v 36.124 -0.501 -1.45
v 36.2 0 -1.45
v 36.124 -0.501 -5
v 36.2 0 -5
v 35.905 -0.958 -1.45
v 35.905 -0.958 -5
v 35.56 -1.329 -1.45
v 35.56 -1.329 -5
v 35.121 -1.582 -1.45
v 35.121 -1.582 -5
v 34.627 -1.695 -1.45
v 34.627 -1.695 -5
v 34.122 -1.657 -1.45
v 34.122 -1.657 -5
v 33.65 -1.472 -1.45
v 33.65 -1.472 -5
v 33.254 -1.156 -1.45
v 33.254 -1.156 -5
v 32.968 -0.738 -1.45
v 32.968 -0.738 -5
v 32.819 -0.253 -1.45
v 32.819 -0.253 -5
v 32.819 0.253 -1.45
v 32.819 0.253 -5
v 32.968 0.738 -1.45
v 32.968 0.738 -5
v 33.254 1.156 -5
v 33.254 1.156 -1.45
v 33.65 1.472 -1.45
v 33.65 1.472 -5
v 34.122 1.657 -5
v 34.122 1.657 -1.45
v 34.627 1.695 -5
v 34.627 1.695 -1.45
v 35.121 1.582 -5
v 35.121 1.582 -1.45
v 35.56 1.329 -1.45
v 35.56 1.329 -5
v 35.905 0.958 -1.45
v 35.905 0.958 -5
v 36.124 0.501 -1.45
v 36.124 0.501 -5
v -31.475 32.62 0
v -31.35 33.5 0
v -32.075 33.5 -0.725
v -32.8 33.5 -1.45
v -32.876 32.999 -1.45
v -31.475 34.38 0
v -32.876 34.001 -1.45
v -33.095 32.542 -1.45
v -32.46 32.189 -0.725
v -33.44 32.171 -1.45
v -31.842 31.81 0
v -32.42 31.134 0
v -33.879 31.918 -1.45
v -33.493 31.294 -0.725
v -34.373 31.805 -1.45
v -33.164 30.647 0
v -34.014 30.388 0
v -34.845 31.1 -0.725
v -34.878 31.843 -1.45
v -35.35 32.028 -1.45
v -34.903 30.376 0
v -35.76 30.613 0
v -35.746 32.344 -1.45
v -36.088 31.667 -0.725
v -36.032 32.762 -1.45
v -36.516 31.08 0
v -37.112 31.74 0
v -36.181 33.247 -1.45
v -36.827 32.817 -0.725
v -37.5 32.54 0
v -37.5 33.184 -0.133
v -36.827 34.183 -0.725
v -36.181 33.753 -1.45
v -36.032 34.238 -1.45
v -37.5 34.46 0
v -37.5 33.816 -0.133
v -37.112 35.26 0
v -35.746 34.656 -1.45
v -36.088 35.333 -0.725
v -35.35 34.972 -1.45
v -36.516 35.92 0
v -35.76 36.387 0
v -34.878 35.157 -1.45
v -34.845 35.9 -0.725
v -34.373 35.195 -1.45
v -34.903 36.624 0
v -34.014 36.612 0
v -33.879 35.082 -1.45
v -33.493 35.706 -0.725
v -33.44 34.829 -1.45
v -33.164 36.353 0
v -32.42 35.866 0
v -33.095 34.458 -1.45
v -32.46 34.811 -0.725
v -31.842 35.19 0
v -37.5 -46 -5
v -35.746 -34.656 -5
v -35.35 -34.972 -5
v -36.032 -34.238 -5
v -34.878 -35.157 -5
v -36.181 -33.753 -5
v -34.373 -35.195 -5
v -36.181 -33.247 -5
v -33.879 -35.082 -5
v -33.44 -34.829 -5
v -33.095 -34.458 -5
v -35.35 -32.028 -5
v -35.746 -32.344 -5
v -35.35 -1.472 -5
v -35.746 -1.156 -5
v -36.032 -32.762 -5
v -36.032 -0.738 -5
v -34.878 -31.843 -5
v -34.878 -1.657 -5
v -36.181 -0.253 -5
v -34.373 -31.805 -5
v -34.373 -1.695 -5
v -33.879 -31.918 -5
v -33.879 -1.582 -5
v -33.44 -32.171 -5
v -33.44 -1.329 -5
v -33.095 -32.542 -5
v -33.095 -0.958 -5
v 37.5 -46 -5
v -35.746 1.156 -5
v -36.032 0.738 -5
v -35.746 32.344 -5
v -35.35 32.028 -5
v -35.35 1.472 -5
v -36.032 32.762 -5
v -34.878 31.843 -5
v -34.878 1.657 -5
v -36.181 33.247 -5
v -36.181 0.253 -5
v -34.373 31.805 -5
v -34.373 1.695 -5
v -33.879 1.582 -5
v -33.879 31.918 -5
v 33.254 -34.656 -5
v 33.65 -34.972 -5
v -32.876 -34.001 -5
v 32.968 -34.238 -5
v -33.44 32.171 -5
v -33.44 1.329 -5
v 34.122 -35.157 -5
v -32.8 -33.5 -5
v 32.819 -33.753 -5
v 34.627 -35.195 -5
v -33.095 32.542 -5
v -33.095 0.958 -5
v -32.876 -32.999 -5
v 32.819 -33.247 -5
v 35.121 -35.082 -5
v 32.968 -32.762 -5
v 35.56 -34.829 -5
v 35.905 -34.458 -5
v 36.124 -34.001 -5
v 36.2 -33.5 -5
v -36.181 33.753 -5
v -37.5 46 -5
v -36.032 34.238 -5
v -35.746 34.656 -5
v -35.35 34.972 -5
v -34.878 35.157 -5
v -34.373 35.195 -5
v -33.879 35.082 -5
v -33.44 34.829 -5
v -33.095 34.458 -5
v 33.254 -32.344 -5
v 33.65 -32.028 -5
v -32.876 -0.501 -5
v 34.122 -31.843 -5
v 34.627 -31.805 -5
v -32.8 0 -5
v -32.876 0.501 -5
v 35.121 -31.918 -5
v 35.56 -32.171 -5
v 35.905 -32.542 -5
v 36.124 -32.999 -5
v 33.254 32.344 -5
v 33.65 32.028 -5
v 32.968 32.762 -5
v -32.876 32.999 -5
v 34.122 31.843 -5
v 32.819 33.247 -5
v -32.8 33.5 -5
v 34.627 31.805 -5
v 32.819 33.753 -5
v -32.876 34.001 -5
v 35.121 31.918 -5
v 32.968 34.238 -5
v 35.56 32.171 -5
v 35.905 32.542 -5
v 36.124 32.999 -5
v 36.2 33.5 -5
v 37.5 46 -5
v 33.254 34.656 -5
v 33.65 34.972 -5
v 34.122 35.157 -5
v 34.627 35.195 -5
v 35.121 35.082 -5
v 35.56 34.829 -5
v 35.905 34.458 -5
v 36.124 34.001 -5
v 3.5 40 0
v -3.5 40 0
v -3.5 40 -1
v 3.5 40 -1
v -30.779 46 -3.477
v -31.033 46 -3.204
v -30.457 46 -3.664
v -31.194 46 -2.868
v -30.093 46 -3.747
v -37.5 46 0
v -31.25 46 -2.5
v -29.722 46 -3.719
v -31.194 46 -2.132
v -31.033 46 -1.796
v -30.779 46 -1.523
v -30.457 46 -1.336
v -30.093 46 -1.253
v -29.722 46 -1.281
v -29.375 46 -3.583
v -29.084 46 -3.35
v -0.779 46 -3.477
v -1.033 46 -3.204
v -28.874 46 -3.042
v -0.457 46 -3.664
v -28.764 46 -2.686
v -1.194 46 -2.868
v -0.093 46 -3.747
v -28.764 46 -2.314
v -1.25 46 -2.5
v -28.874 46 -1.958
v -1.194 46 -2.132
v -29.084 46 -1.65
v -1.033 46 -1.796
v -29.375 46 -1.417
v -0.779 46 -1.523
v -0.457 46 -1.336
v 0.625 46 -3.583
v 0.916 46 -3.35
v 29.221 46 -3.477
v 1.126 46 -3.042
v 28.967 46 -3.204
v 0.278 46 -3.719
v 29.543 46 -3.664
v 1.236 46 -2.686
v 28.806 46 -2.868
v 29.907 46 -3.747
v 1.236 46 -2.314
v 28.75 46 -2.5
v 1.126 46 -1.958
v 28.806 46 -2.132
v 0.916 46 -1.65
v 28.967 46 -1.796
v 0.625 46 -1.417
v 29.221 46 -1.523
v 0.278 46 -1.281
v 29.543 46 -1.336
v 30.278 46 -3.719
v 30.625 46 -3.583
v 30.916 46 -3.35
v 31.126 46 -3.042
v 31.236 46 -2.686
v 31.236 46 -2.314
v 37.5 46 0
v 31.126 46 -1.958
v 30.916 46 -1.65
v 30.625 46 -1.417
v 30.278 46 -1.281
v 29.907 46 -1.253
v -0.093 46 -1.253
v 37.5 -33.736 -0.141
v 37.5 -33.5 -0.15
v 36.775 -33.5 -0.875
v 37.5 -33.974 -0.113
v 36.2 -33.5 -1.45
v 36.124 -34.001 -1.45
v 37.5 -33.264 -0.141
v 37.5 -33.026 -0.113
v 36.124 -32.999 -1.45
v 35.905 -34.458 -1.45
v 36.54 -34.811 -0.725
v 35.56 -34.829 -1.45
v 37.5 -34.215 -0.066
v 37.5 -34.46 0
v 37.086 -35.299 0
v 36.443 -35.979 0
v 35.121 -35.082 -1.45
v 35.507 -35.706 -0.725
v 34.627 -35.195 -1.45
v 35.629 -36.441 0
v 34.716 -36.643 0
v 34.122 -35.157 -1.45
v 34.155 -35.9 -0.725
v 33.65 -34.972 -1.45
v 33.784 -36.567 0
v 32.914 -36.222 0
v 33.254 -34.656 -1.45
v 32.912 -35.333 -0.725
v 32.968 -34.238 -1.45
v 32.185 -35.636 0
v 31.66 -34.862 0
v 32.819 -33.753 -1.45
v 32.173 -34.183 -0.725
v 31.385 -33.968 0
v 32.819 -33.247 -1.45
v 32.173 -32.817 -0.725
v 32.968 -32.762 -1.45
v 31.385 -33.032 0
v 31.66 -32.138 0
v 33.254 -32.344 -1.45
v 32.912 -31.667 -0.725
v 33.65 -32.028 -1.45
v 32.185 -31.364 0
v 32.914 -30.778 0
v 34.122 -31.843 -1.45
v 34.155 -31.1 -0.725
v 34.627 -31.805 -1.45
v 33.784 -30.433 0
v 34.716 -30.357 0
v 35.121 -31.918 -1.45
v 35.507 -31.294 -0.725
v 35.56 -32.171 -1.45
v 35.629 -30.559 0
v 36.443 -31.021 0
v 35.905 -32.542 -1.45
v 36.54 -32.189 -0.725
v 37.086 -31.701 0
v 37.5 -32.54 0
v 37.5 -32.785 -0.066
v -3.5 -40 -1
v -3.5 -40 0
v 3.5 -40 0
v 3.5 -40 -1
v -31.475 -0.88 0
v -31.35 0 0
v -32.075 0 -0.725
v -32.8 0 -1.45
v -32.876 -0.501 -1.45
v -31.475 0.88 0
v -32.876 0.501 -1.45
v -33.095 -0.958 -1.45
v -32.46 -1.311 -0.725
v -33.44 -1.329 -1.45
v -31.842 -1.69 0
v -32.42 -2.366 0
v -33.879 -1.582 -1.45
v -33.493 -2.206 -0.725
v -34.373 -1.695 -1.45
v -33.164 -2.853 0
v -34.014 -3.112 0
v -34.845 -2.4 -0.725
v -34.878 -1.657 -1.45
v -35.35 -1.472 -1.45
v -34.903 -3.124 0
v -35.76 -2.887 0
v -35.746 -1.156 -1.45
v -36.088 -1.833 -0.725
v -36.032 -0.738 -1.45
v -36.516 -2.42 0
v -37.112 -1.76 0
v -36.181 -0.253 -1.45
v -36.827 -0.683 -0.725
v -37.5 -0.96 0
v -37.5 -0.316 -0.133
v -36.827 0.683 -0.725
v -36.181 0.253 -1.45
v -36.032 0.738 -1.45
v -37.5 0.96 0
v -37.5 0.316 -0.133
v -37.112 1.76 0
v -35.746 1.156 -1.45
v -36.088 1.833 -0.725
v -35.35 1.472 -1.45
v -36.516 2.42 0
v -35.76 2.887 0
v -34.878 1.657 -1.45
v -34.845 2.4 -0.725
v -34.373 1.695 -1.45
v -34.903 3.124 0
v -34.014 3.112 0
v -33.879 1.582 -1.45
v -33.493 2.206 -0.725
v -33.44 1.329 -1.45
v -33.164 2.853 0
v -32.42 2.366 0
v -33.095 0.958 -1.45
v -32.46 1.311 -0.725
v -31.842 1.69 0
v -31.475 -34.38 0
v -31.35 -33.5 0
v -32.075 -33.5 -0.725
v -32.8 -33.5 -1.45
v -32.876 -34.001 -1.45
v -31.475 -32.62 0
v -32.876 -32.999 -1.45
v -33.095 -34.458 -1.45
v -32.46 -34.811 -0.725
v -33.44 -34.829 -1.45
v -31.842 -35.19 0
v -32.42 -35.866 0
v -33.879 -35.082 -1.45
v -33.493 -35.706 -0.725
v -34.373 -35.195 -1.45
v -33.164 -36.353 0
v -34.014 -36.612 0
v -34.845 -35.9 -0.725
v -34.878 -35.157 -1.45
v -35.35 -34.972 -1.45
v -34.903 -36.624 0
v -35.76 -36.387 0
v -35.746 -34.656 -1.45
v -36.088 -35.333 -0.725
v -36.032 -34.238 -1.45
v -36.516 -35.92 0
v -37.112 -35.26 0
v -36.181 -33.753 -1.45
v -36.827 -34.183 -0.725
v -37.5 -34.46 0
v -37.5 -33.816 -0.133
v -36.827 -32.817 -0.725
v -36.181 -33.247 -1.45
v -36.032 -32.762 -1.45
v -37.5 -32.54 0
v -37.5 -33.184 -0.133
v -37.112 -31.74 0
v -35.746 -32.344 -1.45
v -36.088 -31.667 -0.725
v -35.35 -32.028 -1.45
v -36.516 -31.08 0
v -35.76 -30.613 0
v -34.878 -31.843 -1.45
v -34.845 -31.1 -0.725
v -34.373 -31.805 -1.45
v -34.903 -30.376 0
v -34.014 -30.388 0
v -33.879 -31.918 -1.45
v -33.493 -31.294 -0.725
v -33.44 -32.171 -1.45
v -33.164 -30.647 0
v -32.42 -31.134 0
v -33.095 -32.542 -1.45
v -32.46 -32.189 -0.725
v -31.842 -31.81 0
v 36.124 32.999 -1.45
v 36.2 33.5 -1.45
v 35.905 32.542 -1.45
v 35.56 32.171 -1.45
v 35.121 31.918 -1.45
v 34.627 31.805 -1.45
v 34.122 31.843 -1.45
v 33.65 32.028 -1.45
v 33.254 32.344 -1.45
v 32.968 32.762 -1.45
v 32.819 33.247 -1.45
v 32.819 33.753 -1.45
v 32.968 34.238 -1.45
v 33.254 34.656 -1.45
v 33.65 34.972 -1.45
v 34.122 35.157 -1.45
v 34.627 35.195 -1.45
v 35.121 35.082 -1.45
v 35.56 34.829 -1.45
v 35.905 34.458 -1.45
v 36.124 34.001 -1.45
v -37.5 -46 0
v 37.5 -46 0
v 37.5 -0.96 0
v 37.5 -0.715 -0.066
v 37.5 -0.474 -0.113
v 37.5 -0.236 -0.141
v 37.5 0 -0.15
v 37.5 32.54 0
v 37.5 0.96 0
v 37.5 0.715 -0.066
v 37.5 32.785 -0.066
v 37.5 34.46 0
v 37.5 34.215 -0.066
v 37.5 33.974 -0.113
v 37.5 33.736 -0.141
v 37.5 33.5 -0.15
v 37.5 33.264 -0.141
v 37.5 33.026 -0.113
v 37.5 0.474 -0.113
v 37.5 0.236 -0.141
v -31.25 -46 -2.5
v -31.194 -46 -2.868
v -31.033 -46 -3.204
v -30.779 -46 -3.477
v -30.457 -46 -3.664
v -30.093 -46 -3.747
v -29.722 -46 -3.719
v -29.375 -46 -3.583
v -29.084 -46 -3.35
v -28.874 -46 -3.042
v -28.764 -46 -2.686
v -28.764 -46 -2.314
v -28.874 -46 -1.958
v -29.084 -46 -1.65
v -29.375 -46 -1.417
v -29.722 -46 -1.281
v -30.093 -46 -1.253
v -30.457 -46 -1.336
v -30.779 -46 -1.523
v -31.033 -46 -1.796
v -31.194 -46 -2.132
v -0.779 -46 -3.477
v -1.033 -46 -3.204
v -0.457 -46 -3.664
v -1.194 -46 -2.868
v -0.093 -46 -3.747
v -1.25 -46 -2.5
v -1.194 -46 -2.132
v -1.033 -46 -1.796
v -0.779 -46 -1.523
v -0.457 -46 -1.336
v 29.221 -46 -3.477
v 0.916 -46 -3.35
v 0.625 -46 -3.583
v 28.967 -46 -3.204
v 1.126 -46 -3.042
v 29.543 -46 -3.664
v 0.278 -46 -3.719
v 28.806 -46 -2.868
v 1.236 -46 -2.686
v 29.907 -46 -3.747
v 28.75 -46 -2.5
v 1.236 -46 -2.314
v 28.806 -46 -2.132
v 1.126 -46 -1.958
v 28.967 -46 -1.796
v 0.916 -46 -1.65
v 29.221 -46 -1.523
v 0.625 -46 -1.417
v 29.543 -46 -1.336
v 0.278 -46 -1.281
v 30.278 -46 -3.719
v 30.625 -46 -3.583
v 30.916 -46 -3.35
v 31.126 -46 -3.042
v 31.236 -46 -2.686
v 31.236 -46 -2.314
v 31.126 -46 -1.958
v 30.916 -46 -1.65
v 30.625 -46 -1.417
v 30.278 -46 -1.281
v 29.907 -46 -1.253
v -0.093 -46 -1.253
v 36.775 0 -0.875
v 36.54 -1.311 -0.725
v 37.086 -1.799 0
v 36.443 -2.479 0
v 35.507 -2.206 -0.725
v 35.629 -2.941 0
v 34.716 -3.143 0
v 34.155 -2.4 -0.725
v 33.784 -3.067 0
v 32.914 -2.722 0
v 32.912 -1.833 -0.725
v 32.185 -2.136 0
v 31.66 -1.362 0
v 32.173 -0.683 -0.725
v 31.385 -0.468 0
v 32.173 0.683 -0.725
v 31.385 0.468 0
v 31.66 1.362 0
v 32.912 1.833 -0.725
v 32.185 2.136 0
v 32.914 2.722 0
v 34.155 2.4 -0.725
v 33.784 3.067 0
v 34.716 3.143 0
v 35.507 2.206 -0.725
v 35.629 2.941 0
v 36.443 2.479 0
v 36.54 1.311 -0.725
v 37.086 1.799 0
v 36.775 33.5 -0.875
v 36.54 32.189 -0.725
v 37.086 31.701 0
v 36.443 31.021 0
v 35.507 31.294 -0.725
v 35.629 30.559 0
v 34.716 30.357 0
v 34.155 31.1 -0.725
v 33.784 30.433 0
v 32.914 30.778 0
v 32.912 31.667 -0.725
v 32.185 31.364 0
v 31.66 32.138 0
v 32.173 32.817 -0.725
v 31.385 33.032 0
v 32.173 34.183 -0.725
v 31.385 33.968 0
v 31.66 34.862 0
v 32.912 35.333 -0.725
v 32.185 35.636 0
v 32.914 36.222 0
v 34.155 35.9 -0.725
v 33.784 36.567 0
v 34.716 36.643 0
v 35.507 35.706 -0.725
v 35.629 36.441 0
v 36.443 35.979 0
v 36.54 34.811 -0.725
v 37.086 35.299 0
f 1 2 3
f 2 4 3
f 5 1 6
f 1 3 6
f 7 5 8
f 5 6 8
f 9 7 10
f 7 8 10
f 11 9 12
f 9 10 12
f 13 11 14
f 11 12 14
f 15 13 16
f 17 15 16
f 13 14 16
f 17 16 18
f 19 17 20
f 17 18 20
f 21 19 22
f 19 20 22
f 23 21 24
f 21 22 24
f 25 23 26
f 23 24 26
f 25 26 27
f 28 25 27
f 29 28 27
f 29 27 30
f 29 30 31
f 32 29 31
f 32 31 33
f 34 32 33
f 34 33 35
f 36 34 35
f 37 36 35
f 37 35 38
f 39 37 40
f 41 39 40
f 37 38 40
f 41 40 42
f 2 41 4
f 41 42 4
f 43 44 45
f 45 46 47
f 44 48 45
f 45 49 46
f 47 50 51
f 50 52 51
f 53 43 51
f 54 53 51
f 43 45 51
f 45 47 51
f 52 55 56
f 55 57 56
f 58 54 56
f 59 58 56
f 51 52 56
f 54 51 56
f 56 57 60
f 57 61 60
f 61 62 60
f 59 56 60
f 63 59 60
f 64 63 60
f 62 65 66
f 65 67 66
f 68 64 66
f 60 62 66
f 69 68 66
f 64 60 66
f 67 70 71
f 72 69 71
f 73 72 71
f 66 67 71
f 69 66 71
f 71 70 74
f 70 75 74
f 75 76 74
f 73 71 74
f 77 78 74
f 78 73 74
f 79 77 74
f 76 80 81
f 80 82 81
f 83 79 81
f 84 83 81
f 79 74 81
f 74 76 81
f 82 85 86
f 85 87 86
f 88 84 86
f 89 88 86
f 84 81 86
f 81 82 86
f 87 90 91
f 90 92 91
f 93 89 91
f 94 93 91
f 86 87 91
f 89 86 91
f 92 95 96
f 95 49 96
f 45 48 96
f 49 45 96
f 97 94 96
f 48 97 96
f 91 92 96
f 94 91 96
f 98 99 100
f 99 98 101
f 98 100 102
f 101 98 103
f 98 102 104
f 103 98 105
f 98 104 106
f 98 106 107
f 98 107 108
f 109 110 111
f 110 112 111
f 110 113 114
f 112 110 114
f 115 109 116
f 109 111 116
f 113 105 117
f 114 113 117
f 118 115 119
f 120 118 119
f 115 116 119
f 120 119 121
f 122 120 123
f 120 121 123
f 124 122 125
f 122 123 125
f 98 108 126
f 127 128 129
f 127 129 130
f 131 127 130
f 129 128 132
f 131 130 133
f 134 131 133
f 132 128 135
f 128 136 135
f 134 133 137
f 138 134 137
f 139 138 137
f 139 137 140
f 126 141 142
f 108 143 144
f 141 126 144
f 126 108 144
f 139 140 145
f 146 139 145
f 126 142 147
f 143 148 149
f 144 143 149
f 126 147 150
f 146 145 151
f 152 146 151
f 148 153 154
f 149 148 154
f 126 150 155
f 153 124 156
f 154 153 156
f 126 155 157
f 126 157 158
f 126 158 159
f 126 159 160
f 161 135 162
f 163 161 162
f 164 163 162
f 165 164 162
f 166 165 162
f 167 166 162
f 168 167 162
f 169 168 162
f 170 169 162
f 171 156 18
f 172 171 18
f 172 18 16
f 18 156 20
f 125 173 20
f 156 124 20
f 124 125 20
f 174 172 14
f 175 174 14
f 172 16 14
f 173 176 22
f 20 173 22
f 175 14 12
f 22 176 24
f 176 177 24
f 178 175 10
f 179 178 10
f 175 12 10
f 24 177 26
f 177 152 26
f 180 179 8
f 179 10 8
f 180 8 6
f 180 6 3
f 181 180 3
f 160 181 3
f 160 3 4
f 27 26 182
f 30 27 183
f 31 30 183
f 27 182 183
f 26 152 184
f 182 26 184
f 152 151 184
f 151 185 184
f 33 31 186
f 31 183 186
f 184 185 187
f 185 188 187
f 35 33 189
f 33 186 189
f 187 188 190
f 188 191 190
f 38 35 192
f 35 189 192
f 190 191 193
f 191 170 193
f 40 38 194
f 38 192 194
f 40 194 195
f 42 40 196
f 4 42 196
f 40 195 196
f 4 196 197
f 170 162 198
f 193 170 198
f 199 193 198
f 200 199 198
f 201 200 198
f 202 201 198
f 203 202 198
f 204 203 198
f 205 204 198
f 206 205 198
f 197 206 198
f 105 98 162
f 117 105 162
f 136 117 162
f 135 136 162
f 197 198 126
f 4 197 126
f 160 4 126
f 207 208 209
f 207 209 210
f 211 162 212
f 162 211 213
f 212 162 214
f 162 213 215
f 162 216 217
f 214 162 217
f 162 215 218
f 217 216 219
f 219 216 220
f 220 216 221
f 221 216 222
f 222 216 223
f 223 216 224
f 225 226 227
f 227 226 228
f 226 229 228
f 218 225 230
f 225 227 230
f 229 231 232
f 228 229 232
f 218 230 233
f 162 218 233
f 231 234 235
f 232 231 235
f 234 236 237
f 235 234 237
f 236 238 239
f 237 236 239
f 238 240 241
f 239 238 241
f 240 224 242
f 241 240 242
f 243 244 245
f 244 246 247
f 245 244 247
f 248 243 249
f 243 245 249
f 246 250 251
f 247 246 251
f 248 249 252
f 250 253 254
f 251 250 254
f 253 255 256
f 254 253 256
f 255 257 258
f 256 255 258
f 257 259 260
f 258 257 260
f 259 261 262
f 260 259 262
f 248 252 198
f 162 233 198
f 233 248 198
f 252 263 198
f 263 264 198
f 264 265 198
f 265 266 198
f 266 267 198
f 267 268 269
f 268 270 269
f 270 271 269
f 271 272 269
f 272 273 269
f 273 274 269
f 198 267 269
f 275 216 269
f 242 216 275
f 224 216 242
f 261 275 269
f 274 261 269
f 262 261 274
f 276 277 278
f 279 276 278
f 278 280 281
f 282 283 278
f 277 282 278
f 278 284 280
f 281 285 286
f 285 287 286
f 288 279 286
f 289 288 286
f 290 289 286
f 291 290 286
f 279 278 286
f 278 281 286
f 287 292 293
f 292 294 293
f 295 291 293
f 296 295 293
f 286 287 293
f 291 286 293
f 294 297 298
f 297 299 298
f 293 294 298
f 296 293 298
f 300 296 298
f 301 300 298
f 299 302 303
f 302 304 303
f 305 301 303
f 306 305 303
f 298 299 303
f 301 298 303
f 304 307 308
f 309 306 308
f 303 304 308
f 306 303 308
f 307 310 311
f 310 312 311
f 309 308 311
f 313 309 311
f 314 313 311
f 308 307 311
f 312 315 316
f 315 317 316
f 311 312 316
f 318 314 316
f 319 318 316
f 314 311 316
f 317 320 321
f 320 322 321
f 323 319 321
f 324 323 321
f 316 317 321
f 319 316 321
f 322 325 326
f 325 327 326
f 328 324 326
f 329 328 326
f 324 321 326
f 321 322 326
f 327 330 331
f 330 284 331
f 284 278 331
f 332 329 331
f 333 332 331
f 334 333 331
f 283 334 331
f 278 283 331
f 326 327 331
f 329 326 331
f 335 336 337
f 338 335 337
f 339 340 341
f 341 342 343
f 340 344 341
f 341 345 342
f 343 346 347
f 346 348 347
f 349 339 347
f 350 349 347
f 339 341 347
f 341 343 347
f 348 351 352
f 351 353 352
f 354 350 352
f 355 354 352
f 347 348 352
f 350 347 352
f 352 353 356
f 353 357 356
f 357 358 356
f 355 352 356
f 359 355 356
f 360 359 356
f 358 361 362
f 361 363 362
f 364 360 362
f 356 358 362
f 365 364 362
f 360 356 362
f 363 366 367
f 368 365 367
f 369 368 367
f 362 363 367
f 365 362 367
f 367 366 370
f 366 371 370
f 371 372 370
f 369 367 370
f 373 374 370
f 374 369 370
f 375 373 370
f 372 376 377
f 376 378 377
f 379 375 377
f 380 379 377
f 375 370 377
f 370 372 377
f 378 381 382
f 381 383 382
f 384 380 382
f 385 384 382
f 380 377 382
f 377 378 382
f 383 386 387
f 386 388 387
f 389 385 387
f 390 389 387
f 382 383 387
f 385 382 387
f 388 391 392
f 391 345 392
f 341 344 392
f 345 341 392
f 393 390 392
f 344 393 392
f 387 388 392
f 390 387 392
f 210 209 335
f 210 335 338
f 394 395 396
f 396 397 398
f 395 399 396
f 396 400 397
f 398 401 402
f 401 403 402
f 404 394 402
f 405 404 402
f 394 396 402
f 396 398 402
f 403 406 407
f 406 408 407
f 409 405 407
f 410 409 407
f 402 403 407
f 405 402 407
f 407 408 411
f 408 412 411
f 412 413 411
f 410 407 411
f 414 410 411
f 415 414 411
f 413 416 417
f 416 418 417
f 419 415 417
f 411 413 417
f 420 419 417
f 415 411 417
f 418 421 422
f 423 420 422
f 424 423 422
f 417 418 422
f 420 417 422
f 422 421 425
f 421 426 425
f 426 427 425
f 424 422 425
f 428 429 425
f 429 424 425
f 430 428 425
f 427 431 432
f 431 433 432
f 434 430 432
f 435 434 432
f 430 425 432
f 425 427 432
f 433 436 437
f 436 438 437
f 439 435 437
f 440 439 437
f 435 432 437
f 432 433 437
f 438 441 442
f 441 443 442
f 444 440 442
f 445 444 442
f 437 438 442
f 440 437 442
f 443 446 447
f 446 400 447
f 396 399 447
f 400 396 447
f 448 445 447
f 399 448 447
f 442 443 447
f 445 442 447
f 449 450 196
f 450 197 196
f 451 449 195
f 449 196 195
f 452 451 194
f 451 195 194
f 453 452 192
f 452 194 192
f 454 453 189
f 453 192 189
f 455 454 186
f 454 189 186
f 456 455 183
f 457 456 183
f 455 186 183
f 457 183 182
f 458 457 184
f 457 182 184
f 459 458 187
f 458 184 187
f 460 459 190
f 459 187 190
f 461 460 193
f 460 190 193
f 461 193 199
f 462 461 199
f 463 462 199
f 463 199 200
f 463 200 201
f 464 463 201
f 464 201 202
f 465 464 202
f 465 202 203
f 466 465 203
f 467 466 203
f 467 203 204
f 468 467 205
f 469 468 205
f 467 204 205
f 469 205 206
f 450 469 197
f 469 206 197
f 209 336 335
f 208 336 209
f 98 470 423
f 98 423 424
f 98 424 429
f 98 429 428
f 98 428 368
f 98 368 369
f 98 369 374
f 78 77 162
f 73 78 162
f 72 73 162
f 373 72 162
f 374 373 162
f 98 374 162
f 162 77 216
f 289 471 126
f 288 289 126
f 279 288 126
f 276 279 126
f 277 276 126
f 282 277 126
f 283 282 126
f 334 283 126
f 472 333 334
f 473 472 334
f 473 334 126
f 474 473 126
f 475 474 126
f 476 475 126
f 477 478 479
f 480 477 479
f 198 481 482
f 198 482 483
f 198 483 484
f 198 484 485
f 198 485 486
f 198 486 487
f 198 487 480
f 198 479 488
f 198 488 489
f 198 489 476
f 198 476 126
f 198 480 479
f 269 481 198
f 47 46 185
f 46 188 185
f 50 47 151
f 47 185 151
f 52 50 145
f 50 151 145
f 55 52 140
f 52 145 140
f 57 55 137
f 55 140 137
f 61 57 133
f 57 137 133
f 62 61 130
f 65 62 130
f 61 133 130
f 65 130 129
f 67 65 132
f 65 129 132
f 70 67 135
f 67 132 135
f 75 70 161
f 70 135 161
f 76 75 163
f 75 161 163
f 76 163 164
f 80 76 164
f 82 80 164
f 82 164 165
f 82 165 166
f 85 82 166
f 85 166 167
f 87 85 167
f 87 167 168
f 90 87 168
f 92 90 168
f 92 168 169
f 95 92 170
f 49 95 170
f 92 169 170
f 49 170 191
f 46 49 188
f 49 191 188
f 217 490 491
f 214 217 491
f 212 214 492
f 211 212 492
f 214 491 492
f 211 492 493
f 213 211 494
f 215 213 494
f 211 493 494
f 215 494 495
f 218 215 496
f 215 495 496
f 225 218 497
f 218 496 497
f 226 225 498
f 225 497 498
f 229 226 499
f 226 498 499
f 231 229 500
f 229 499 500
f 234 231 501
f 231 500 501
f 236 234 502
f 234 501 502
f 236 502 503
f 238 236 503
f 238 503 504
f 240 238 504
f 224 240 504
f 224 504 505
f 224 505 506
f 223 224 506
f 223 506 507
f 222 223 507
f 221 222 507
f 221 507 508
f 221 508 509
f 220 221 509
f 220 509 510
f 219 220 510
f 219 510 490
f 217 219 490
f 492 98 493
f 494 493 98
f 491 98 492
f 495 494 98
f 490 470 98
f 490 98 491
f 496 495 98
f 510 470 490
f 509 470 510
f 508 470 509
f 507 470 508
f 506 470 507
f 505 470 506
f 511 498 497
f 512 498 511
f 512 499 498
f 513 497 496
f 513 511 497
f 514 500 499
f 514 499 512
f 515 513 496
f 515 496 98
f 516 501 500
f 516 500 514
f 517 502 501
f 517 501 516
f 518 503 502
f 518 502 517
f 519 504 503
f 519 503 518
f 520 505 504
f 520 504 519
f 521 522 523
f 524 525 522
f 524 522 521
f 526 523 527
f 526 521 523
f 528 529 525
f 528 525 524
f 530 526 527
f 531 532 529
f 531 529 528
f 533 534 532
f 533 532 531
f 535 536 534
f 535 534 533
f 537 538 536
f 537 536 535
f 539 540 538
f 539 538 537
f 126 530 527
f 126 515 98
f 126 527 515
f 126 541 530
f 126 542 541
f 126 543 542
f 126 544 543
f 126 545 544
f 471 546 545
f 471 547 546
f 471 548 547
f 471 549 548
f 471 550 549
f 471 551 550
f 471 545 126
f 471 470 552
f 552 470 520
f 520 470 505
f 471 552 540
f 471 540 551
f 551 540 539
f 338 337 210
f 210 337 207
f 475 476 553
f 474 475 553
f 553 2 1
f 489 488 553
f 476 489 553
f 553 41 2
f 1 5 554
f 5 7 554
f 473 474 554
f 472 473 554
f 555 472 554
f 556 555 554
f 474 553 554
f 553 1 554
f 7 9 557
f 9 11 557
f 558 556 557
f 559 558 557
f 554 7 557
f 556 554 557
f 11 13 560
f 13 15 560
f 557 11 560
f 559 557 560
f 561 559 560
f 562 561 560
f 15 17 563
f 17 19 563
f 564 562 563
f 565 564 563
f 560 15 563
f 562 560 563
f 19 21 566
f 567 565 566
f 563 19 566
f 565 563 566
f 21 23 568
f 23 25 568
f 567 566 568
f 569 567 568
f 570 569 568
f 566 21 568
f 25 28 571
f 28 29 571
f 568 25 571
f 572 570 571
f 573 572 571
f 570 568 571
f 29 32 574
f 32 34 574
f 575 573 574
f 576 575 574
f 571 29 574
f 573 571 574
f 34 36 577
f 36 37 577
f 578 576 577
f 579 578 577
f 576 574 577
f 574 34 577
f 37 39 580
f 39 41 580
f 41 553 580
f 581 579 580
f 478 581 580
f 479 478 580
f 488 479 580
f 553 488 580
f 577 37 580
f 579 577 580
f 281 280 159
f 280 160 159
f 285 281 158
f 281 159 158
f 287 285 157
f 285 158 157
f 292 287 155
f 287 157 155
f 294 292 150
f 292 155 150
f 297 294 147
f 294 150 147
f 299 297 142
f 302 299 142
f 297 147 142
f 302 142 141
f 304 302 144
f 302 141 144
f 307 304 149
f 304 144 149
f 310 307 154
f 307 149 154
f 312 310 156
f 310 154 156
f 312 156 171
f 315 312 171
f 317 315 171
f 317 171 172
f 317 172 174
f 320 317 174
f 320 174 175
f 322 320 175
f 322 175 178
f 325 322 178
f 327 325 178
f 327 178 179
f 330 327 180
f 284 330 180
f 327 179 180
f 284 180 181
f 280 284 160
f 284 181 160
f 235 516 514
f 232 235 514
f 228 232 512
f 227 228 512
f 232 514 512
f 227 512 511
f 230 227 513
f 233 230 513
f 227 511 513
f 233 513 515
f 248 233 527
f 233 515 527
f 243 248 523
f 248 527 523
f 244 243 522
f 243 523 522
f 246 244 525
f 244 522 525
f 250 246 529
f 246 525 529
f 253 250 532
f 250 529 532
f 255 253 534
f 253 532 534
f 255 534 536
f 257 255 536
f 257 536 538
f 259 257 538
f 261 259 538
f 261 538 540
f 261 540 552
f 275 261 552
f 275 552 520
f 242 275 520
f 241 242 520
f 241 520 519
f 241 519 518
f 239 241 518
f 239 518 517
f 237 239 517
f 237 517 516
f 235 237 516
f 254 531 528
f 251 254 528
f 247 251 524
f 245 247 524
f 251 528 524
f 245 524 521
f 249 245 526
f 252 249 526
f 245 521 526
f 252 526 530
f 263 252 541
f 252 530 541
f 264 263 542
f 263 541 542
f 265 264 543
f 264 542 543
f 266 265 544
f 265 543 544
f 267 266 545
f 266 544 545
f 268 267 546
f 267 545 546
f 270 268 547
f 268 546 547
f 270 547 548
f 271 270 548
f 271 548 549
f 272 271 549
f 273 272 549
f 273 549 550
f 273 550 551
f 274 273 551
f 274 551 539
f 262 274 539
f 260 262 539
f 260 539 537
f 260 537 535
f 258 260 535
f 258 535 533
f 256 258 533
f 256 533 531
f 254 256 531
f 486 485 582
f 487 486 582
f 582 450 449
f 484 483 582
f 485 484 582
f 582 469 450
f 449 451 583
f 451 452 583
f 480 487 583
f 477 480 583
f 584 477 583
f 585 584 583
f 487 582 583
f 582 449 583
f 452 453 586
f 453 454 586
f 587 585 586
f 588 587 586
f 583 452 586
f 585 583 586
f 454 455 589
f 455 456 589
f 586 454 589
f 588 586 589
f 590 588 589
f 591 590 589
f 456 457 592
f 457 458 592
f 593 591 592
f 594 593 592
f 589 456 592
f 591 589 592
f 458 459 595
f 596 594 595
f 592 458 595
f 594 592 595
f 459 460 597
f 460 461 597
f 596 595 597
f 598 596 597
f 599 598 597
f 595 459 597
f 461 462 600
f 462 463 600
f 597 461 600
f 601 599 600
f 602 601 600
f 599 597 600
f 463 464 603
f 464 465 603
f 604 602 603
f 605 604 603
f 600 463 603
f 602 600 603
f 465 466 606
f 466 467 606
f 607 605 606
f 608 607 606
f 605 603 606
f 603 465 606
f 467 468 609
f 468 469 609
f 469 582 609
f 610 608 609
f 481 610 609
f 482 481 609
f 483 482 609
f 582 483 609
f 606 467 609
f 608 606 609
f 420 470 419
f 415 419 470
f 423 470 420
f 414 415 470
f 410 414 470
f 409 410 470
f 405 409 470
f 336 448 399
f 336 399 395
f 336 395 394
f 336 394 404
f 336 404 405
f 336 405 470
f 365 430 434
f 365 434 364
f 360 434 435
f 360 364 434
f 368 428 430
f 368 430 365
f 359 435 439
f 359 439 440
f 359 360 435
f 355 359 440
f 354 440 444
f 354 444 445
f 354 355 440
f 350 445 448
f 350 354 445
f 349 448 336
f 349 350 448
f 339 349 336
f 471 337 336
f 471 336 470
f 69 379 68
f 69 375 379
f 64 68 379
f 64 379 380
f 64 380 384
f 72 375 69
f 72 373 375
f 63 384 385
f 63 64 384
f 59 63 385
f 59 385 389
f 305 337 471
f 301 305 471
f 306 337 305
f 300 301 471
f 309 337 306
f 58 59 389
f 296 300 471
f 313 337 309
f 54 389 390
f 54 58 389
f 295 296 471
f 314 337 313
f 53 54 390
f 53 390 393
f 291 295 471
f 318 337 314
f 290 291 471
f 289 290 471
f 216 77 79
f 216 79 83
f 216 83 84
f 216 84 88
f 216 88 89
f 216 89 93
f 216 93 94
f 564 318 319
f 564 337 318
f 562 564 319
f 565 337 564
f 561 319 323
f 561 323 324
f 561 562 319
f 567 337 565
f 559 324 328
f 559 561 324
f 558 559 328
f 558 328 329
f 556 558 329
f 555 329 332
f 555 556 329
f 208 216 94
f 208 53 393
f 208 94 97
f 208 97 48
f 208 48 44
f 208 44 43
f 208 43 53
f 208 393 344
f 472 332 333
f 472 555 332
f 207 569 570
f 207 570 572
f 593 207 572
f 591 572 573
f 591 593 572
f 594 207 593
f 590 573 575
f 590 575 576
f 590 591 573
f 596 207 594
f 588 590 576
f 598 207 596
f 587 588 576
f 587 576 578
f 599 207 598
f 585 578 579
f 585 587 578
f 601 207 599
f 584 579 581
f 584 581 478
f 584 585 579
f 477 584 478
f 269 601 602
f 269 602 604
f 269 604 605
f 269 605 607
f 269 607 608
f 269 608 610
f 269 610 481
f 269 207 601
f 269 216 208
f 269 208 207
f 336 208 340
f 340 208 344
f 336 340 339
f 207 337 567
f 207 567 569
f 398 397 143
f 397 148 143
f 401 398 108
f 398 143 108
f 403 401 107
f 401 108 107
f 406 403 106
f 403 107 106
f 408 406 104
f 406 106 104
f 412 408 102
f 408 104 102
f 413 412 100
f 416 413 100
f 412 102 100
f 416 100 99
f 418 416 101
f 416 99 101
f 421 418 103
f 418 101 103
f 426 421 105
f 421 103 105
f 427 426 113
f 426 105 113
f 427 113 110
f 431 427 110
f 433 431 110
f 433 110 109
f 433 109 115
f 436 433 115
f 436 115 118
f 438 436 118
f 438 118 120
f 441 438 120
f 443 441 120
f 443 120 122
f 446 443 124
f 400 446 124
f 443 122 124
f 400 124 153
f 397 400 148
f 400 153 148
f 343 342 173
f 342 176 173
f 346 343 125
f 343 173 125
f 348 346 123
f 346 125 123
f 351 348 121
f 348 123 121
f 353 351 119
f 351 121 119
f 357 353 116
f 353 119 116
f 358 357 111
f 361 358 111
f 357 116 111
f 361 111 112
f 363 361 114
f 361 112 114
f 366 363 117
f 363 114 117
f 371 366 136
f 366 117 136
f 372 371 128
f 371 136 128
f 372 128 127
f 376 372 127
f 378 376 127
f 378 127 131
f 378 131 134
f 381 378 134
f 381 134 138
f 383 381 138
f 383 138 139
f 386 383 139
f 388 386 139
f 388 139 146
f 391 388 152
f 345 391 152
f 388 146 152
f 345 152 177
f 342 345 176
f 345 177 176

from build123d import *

# Parameters (mm, degrees)
SKETCH_1_W                   = 75
SKETCH_1_H                   = 92
EXTRUDE_460_DEPTH            = 5
HOLE_WIZARD_M3_D             = 2.5
HOLE_WIZARD_M3_2_D           = 3.4
HOLE_WIZARD_M3_2_CSINK_D     = 6.3
HOLE_WIZARD_M3_2_CSINK_ANGLE = 90
SKETCH_6_W                   = 7
SKETCH_6_H                   = 80
CUT_EXTRUDE_1_DEPTH          = 1


with BuildPart() as part:
    # Эскиз1 → Extrude 460 (new body)
    with BuildSketch(Plane.XY):
        Rectangle(SKETCH_1_W, SKETCH_1_H)
    extrude(amount=-EXTRUDE_460_DEPTH)

    # Hole Wizard M3 (through all)
    with Locations(Plane(origin=(0, 46, 0), x_dir=(1, 0, 0), z_dir=(0, 1, 0))):
        with Locations((30, 2.5), (-30, 2.5), (0, 2.5)):
            Hole(HOLE_WIZARD_M3_D / 2)

    # Hole Wizard M3 2 (through all)
    with Locations(Plane(origin=(45, 0, 0), x_dir=(-1, 0, 0), z_dir=(0, 0, 1))):
        with Locations((10.5, 0), (10.5, -33.5), (10.5, 33.5), (79.5, -33.5), (79.5, 0), (79.5, 33.5)):
            CounterSinkHole(HOLE_WIZARD_M3_2_D / 2, HOLE_WIZARD_M3_2_CSINK_D / 2, counter_sink_angle=HOLE_WIZARD_M3_2_CSINK_ANGLE)

    # Эскиз6 → Вырез-Вытянуть1 (cut)
    with BuildSketch(Plane.XY):
        Rectangle(SKETCH_6_W, SKETCH_6_H)
    extrude(amount=-CUT_EXTRUDE_1_DEPTH, mode=Mode.SUBTRACT)


solid = part.part
